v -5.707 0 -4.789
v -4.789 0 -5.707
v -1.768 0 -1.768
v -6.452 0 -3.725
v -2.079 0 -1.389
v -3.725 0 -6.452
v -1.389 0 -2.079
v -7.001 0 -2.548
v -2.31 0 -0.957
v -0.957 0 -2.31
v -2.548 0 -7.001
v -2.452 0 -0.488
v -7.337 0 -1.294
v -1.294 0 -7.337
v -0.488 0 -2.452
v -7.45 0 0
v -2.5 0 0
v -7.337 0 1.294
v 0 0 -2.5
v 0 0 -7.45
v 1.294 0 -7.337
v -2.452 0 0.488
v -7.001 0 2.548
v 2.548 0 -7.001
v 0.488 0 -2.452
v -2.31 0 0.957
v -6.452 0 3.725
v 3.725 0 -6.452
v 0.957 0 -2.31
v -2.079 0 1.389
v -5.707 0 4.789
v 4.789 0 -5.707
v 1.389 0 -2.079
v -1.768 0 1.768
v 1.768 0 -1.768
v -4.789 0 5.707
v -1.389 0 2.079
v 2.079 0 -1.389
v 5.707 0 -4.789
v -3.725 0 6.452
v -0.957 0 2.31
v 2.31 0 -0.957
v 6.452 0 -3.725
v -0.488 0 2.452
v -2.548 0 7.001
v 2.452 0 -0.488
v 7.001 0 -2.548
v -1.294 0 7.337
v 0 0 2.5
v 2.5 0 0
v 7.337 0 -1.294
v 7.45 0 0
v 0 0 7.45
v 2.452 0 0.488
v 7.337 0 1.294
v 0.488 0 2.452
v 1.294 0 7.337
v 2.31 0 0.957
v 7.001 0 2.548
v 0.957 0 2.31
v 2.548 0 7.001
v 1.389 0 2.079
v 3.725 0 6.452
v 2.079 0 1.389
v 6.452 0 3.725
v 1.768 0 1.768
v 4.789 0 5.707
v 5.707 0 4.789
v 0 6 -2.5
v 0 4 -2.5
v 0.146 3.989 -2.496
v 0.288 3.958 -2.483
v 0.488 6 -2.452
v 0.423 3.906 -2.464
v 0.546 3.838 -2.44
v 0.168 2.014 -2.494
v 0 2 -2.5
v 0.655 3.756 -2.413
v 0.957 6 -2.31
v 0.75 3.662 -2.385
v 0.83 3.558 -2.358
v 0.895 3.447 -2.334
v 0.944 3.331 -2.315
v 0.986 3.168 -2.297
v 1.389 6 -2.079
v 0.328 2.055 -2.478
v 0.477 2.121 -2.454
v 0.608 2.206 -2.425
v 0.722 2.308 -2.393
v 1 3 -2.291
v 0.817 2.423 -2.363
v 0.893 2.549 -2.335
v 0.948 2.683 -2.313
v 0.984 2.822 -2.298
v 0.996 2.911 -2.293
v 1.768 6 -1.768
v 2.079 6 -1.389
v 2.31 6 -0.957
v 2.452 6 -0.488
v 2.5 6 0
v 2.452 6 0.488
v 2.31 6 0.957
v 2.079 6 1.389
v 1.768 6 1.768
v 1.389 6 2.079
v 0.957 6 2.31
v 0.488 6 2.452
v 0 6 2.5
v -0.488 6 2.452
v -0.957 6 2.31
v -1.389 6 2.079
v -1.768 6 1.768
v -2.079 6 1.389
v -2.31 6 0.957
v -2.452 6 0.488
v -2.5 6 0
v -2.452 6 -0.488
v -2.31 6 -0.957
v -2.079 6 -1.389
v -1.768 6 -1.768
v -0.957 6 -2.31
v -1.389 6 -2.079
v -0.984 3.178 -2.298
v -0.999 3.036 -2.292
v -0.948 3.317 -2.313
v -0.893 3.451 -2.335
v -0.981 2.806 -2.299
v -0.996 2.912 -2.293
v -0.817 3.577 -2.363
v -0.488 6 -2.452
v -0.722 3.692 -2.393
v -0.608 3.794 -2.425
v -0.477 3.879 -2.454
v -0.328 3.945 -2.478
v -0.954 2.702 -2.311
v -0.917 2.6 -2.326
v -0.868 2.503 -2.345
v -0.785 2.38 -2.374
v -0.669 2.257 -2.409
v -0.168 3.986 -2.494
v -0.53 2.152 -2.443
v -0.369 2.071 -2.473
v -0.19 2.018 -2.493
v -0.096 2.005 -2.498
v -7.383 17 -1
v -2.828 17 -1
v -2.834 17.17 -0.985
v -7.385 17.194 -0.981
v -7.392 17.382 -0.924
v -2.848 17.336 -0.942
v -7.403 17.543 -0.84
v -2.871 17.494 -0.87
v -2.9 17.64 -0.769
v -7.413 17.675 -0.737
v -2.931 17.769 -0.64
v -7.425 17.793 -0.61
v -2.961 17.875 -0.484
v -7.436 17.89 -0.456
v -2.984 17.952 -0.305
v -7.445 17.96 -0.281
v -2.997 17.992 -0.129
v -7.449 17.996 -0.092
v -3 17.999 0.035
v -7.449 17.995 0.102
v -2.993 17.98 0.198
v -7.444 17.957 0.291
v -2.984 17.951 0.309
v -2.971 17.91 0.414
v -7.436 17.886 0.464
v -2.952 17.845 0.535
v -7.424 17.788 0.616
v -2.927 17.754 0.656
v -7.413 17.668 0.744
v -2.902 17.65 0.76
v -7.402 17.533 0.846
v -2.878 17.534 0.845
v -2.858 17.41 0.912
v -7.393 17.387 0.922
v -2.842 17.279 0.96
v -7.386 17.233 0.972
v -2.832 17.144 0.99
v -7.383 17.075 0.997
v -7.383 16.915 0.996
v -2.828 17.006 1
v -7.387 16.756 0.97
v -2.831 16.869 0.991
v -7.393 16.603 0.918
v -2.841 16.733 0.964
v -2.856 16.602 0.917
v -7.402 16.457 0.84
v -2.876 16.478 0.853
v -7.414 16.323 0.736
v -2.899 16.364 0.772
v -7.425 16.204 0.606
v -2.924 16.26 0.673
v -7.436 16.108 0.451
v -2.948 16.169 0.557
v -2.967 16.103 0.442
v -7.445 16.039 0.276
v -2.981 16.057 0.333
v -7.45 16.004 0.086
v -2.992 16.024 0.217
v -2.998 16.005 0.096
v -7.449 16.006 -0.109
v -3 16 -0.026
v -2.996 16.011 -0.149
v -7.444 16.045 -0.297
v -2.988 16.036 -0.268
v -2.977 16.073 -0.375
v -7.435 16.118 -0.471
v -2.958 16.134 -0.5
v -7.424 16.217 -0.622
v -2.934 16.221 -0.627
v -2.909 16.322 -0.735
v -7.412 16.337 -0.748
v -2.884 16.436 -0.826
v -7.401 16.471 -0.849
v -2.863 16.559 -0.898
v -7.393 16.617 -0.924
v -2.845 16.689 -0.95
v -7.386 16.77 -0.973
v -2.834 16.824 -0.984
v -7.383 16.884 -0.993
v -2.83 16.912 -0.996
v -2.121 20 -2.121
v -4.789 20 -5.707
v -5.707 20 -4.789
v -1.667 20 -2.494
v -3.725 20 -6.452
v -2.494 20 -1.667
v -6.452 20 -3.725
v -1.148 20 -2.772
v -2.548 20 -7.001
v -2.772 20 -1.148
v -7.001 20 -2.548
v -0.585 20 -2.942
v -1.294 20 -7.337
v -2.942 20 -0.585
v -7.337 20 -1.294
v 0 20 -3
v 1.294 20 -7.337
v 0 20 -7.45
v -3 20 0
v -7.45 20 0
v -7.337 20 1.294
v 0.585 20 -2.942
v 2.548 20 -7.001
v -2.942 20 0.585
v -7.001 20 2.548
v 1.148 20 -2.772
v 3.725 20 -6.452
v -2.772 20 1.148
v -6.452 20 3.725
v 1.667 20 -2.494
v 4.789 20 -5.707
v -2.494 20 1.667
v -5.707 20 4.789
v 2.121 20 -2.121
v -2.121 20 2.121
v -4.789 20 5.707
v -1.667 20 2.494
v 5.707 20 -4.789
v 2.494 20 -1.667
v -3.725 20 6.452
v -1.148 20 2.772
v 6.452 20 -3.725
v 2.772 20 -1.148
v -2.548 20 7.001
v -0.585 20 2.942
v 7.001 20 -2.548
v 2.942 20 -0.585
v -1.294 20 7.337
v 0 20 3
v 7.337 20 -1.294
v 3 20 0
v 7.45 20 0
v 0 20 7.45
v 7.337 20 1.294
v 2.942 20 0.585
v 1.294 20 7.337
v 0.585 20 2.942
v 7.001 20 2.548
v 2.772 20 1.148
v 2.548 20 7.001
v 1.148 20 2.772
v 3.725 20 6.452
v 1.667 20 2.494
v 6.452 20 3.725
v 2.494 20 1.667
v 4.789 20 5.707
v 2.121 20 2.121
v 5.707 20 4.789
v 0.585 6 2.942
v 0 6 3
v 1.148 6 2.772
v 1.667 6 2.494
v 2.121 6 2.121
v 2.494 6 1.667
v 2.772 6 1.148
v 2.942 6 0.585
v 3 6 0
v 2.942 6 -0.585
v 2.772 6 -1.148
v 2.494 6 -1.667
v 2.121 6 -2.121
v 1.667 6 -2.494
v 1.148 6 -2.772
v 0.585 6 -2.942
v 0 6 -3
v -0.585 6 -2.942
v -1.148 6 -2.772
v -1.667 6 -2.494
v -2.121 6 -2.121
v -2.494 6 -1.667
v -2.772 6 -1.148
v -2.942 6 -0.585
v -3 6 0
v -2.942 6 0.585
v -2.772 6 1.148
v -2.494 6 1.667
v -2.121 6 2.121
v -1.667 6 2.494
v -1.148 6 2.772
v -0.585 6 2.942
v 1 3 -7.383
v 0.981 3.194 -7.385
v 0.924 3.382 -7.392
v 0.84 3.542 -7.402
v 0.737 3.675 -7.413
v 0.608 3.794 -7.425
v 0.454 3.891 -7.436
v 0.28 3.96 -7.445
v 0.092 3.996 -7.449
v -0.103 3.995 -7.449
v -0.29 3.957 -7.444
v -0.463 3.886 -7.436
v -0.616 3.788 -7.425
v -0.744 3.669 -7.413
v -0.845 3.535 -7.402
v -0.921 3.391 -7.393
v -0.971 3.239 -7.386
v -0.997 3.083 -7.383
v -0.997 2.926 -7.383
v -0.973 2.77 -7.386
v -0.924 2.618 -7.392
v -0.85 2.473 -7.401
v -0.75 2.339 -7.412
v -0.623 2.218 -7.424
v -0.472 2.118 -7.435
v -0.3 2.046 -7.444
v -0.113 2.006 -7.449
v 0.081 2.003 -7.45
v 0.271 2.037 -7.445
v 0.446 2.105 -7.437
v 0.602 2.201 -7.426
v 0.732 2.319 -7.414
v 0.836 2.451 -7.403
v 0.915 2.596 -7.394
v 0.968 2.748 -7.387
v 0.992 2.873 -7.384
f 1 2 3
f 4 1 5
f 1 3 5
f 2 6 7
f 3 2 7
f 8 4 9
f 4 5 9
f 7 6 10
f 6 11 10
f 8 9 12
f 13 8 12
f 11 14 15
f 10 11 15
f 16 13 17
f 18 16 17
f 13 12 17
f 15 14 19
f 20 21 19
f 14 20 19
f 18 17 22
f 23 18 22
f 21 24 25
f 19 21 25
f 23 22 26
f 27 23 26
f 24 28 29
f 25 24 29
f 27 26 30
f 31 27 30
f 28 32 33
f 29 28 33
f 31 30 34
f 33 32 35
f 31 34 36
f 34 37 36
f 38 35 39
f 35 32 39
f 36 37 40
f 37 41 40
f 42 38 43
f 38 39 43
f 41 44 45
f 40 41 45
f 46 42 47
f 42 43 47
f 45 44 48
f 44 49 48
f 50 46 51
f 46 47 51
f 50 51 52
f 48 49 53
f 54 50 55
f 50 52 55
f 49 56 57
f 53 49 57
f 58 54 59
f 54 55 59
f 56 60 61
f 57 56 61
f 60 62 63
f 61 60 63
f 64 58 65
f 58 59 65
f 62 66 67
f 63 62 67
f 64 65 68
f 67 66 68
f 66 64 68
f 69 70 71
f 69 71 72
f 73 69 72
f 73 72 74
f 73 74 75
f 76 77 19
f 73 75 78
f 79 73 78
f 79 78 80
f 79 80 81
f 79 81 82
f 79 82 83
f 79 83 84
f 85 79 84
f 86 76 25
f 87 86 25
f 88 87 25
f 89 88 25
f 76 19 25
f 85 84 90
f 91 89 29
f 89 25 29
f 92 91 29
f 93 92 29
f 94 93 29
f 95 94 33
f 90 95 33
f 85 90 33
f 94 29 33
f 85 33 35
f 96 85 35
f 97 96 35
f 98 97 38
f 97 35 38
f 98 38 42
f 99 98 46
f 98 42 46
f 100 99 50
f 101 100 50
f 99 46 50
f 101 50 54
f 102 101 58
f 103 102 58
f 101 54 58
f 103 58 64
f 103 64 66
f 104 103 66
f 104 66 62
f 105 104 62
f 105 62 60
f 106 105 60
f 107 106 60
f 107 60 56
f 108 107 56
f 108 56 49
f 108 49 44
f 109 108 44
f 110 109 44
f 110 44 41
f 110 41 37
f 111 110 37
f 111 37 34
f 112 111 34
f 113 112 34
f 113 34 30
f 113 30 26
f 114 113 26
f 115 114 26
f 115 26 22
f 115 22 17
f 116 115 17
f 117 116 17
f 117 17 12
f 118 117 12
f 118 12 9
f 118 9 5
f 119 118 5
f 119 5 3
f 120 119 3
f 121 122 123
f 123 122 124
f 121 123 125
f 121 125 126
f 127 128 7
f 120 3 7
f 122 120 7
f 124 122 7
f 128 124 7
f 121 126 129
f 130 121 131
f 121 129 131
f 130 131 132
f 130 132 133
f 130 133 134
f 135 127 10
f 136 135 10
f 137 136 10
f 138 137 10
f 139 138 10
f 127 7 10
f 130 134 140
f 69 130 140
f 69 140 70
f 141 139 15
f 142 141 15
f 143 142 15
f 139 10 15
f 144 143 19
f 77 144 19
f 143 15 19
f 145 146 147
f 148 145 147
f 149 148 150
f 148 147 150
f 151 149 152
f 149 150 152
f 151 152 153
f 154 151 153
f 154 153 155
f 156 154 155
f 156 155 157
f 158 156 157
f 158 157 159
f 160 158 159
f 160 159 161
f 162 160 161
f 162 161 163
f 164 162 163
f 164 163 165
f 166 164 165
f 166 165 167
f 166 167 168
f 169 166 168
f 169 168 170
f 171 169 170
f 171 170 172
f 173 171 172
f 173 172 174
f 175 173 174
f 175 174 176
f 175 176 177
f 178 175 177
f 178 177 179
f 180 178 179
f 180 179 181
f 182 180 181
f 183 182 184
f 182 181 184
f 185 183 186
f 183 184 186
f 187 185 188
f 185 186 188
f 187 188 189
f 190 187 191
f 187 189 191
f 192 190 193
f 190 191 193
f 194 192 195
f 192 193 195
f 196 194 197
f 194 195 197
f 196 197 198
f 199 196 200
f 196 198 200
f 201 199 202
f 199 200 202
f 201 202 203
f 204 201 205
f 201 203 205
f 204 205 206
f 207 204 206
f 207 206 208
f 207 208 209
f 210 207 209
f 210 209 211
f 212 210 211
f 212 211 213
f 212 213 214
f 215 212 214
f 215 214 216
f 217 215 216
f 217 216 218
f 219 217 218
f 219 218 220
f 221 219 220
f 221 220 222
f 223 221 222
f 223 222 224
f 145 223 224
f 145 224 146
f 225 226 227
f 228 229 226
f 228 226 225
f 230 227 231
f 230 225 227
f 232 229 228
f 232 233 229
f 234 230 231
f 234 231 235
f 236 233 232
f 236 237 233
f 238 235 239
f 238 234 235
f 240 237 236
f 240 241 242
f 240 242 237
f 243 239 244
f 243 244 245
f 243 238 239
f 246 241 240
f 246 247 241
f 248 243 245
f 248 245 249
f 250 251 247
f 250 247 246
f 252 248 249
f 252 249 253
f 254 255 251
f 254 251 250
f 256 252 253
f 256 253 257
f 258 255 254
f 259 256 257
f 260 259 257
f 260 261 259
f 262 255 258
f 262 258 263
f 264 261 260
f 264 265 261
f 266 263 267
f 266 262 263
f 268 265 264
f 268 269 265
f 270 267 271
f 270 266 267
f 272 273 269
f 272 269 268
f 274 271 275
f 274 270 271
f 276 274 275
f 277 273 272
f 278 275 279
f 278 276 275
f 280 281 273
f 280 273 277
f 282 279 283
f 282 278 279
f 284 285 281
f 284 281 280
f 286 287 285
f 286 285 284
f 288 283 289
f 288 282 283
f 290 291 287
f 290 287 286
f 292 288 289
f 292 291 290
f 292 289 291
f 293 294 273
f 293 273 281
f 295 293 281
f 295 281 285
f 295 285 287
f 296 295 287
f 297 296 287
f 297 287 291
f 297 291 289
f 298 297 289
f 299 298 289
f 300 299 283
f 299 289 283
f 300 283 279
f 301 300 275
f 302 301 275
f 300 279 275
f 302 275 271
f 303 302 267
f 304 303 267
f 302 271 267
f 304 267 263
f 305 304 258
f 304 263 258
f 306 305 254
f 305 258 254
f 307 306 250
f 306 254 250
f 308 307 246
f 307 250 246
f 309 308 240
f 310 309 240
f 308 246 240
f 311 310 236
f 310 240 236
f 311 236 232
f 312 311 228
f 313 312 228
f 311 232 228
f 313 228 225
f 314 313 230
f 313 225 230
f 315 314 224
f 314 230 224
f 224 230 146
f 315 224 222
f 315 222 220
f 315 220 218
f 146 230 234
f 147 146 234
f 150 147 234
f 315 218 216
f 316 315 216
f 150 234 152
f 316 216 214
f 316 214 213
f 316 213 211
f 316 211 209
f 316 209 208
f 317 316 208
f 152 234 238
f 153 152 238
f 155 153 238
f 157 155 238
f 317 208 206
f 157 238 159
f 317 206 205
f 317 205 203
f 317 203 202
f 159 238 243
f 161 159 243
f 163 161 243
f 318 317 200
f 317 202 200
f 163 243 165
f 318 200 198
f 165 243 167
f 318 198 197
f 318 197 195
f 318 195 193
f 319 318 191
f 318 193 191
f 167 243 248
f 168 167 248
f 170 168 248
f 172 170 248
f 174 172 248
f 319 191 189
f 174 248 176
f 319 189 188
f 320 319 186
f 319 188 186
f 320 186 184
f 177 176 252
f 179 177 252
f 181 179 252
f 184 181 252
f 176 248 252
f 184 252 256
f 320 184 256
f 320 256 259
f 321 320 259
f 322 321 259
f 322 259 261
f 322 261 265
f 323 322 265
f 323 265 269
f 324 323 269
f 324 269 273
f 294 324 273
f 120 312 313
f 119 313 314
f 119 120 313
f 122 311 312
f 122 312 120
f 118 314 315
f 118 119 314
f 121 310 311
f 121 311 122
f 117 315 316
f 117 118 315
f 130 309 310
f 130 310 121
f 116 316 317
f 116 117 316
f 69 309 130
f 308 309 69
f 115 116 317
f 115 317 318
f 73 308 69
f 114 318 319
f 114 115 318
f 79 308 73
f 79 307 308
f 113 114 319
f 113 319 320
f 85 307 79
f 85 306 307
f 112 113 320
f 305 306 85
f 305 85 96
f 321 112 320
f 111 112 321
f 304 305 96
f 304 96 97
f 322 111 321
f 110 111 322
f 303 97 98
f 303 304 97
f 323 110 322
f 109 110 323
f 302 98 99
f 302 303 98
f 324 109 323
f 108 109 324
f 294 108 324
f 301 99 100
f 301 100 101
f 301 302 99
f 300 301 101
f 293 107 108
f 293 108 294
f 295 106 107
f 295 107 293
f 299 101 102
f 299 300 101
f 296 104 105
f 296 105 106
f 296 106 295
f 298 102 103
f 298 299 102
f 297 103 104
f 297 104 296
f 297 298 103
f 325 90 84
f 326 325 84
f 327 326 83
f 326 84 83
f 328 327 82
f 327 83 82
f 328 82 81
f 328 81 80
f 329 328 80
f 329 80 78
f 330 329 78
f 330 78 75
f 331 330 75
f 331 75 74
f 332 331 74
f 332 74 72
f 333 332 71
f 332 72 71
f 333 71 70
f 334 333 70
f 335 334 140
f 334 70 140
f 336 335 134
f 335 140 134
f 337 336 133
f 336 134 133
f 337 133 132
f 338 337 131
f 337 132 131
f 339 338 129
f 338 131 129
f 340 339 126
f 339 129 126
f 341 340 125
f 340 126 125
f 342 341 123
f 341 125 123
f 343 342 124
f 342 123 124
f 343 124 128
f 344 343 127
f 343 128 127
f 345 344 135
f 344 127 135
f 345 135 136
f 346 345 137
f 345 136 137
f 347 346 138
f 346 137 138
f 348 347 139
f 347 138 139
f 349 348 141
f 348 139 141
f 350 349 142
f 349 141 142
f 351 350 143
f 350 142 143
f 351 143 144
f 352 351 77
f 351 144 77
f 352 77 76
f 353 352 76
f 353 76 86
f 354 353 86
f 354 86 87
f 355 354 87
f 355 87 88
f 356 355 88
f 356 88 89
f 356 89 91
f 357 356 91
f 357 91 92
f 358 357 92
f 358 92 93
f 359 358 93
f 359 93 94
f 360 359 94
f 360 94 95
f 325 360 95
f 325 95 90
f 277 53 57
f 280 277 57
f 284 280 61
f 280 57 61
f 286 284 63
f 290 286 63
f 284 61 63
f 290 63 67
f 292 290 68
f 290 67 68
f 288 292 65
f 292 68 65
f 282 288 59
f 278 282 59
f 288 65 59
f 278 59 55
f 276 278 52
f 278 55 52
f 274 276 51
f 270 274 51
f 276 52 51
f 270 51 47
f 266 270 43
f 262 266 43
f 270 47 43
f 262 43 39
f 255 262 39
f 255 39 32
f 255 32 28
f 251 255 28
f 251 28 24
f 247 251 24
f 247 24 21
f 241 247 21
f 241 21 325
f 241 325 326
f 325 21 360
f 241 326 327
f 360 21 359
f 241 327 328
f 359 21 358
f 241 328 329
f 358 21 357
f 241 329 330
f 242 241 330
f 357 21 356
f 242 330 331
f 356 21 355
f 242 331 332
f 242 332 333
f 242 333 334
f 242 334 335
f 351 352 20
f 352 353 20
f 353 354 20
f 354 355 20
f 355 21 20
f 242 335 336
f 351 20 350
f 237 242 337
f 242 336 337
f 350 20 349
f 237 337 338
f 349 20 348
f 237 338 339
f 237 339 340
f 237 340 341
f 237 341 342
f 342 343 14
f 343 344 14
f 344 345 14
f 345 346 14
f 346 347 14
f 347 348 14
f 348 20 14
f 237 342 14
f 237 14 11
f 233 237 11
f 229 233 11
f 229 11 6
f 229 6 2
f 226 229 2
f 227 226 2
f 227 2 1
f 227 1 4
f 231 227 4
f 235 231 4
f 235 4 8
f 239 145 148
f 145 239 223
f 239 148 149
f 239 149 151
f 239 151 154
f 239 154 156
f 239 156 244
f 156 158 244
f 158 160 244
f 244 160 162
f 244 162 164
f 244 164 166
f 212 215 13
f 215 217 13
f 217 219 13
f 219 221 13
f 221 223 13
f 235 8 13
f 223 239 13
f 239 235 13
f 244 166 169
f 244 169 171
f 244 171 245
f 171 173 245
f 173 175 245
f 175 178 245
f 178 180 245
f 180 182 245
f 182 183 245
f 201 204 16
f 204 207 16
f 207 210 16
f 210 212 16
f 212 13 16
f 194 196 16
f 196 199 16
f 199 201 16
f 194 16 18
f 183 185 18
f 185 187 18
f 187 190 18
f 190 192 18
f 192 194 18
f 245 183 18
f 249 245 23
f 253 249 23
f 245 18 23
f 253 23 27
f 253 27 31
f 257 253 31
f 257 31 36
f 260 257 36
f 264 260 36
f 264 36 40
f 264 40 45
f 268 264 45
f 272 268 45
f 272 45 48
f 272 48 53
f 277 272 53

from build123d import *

# Parameters (mm, degrees)
SKETCH1_R               = 7.45
BOSS_EXTRUDE1_DEPTH     = 20
SKETCH2_R               = 3
CUT_EXTRUDE1_DEPTH      = 14
SKETCH3_R               = 2.5
CUT_EXTRUDE2_DEPTH      = 6
CUT_EXTRUDE3_REACH      = 24.605
CUT_EXTRUDE3_END_RADIUS = 7.45
SKETCH4_R               = 1
CUT_EXTRUDE4_REACH      = 24.605
CUT_EXTRUDE4_END_RADIUS = 7.45
SKETCH6_R               = 1


with BuildPart() as part:
    # Sketch1 → Boss-Extrude1 (new body)
    with BuildSketch(Plane(origin=(0, 0, 0), x_dir=(1, 0, 0), z_dir=(0, 1, 0))):
        with Locations(Location((0, 0, 0), (0, 0, 270))):
            Circle(SKETCH1_R)
    extrude(amount=BOSS_EXTRUDE1_DEPTH)

    # Sketch2 → Cut-Extrude1 (cut)
    with BuildSketch(Plane(origin=(0, 20, 0), x_dir=(1, 0, 0), z_dir=(0, 1, 0))):
        with Locations(Location((0, 0, 0), (0, 0, 270))):
            Circle(SKETCH2_R)
    extrude(amount=-CUT_EXTRUDE1_DEPTH, mode=Mode.SUBTRACT)

    # Sketch3 → Cut-Extrude2 (cut)
    with BuildSketch(Plane.XZ):
        with Locations(Location((0, 0, 0), (0, 0, 270))):
            Circle(SKETCH3_R)
    extrude(amount=-CUT_EXTRUDE2_DEPTH, mode=Mode.SUBTRACT)

    # Cut-Extrude3: up to this cylinder (the profile starts inside it)
    cut_extrude3_end = Plane(origin=(0, 17, 0), z_dir=(0, -1, 0)) * Cylinder(CUT_EXTRUDE3_END_RADIUS, 65.11, mode=Mode.PRIVATE)
    # Sketch4 → Cut-Extrude3 (cut, up to the surface)
    with BuildSketch(Plane(origin=(0, 0, 0), x_dir=(0, 0, -1), z_dir=(1, 0, 0)), mode=Mode.PRIVATE) as cut_extrude3_sk1:
        with Locations((0, 17)):
            Circle(SKETCH4_R)
    cut_extrude3_tool1 = extrude(cut_extrude3_sk1.sketch, amount=-CUT_EXTRUDE3_REACH, mode=Mode.PRIVATE) & cut_extrude3_end
    add(cut_extrude3_tool1.solids().sort_by_distance((0, 17, 0))[0], mode=Mode.SUBTRACT)

    # Cut-Extrude4: up to this cylinder (the profile starts inside it)
    cut_extrude4_end = Plane(origin=(0, 3, 0), z_dir=(0, -1, 0)) * Cylinder(CUT_EXTRUDE4_END_RADIUS, 65.11, mode=Mode.PRIVATE)
    # Sketch6 → Cut-Extrude4 (cut, up to the surface)
    with BuildSketch(Plane.XY, mode=Mode.PRIVATE) as cut_extrude4_sk1:
        with Locations((0, 3)):
            Circle(SKETCH6_R)
    cut_extrude4_tool1 = extrude(cut_extrude4_sk1.sketch, amount=-CUT_EXTRUDE4_REACH, mode=Mode.PRIVATE) & cut_extrude4_end
    add(cut_extrude4_tool1.solids().sort_by_distance((0, 3, 0))[0], mode=Mode.SUBTRACT)


solid = part.part
